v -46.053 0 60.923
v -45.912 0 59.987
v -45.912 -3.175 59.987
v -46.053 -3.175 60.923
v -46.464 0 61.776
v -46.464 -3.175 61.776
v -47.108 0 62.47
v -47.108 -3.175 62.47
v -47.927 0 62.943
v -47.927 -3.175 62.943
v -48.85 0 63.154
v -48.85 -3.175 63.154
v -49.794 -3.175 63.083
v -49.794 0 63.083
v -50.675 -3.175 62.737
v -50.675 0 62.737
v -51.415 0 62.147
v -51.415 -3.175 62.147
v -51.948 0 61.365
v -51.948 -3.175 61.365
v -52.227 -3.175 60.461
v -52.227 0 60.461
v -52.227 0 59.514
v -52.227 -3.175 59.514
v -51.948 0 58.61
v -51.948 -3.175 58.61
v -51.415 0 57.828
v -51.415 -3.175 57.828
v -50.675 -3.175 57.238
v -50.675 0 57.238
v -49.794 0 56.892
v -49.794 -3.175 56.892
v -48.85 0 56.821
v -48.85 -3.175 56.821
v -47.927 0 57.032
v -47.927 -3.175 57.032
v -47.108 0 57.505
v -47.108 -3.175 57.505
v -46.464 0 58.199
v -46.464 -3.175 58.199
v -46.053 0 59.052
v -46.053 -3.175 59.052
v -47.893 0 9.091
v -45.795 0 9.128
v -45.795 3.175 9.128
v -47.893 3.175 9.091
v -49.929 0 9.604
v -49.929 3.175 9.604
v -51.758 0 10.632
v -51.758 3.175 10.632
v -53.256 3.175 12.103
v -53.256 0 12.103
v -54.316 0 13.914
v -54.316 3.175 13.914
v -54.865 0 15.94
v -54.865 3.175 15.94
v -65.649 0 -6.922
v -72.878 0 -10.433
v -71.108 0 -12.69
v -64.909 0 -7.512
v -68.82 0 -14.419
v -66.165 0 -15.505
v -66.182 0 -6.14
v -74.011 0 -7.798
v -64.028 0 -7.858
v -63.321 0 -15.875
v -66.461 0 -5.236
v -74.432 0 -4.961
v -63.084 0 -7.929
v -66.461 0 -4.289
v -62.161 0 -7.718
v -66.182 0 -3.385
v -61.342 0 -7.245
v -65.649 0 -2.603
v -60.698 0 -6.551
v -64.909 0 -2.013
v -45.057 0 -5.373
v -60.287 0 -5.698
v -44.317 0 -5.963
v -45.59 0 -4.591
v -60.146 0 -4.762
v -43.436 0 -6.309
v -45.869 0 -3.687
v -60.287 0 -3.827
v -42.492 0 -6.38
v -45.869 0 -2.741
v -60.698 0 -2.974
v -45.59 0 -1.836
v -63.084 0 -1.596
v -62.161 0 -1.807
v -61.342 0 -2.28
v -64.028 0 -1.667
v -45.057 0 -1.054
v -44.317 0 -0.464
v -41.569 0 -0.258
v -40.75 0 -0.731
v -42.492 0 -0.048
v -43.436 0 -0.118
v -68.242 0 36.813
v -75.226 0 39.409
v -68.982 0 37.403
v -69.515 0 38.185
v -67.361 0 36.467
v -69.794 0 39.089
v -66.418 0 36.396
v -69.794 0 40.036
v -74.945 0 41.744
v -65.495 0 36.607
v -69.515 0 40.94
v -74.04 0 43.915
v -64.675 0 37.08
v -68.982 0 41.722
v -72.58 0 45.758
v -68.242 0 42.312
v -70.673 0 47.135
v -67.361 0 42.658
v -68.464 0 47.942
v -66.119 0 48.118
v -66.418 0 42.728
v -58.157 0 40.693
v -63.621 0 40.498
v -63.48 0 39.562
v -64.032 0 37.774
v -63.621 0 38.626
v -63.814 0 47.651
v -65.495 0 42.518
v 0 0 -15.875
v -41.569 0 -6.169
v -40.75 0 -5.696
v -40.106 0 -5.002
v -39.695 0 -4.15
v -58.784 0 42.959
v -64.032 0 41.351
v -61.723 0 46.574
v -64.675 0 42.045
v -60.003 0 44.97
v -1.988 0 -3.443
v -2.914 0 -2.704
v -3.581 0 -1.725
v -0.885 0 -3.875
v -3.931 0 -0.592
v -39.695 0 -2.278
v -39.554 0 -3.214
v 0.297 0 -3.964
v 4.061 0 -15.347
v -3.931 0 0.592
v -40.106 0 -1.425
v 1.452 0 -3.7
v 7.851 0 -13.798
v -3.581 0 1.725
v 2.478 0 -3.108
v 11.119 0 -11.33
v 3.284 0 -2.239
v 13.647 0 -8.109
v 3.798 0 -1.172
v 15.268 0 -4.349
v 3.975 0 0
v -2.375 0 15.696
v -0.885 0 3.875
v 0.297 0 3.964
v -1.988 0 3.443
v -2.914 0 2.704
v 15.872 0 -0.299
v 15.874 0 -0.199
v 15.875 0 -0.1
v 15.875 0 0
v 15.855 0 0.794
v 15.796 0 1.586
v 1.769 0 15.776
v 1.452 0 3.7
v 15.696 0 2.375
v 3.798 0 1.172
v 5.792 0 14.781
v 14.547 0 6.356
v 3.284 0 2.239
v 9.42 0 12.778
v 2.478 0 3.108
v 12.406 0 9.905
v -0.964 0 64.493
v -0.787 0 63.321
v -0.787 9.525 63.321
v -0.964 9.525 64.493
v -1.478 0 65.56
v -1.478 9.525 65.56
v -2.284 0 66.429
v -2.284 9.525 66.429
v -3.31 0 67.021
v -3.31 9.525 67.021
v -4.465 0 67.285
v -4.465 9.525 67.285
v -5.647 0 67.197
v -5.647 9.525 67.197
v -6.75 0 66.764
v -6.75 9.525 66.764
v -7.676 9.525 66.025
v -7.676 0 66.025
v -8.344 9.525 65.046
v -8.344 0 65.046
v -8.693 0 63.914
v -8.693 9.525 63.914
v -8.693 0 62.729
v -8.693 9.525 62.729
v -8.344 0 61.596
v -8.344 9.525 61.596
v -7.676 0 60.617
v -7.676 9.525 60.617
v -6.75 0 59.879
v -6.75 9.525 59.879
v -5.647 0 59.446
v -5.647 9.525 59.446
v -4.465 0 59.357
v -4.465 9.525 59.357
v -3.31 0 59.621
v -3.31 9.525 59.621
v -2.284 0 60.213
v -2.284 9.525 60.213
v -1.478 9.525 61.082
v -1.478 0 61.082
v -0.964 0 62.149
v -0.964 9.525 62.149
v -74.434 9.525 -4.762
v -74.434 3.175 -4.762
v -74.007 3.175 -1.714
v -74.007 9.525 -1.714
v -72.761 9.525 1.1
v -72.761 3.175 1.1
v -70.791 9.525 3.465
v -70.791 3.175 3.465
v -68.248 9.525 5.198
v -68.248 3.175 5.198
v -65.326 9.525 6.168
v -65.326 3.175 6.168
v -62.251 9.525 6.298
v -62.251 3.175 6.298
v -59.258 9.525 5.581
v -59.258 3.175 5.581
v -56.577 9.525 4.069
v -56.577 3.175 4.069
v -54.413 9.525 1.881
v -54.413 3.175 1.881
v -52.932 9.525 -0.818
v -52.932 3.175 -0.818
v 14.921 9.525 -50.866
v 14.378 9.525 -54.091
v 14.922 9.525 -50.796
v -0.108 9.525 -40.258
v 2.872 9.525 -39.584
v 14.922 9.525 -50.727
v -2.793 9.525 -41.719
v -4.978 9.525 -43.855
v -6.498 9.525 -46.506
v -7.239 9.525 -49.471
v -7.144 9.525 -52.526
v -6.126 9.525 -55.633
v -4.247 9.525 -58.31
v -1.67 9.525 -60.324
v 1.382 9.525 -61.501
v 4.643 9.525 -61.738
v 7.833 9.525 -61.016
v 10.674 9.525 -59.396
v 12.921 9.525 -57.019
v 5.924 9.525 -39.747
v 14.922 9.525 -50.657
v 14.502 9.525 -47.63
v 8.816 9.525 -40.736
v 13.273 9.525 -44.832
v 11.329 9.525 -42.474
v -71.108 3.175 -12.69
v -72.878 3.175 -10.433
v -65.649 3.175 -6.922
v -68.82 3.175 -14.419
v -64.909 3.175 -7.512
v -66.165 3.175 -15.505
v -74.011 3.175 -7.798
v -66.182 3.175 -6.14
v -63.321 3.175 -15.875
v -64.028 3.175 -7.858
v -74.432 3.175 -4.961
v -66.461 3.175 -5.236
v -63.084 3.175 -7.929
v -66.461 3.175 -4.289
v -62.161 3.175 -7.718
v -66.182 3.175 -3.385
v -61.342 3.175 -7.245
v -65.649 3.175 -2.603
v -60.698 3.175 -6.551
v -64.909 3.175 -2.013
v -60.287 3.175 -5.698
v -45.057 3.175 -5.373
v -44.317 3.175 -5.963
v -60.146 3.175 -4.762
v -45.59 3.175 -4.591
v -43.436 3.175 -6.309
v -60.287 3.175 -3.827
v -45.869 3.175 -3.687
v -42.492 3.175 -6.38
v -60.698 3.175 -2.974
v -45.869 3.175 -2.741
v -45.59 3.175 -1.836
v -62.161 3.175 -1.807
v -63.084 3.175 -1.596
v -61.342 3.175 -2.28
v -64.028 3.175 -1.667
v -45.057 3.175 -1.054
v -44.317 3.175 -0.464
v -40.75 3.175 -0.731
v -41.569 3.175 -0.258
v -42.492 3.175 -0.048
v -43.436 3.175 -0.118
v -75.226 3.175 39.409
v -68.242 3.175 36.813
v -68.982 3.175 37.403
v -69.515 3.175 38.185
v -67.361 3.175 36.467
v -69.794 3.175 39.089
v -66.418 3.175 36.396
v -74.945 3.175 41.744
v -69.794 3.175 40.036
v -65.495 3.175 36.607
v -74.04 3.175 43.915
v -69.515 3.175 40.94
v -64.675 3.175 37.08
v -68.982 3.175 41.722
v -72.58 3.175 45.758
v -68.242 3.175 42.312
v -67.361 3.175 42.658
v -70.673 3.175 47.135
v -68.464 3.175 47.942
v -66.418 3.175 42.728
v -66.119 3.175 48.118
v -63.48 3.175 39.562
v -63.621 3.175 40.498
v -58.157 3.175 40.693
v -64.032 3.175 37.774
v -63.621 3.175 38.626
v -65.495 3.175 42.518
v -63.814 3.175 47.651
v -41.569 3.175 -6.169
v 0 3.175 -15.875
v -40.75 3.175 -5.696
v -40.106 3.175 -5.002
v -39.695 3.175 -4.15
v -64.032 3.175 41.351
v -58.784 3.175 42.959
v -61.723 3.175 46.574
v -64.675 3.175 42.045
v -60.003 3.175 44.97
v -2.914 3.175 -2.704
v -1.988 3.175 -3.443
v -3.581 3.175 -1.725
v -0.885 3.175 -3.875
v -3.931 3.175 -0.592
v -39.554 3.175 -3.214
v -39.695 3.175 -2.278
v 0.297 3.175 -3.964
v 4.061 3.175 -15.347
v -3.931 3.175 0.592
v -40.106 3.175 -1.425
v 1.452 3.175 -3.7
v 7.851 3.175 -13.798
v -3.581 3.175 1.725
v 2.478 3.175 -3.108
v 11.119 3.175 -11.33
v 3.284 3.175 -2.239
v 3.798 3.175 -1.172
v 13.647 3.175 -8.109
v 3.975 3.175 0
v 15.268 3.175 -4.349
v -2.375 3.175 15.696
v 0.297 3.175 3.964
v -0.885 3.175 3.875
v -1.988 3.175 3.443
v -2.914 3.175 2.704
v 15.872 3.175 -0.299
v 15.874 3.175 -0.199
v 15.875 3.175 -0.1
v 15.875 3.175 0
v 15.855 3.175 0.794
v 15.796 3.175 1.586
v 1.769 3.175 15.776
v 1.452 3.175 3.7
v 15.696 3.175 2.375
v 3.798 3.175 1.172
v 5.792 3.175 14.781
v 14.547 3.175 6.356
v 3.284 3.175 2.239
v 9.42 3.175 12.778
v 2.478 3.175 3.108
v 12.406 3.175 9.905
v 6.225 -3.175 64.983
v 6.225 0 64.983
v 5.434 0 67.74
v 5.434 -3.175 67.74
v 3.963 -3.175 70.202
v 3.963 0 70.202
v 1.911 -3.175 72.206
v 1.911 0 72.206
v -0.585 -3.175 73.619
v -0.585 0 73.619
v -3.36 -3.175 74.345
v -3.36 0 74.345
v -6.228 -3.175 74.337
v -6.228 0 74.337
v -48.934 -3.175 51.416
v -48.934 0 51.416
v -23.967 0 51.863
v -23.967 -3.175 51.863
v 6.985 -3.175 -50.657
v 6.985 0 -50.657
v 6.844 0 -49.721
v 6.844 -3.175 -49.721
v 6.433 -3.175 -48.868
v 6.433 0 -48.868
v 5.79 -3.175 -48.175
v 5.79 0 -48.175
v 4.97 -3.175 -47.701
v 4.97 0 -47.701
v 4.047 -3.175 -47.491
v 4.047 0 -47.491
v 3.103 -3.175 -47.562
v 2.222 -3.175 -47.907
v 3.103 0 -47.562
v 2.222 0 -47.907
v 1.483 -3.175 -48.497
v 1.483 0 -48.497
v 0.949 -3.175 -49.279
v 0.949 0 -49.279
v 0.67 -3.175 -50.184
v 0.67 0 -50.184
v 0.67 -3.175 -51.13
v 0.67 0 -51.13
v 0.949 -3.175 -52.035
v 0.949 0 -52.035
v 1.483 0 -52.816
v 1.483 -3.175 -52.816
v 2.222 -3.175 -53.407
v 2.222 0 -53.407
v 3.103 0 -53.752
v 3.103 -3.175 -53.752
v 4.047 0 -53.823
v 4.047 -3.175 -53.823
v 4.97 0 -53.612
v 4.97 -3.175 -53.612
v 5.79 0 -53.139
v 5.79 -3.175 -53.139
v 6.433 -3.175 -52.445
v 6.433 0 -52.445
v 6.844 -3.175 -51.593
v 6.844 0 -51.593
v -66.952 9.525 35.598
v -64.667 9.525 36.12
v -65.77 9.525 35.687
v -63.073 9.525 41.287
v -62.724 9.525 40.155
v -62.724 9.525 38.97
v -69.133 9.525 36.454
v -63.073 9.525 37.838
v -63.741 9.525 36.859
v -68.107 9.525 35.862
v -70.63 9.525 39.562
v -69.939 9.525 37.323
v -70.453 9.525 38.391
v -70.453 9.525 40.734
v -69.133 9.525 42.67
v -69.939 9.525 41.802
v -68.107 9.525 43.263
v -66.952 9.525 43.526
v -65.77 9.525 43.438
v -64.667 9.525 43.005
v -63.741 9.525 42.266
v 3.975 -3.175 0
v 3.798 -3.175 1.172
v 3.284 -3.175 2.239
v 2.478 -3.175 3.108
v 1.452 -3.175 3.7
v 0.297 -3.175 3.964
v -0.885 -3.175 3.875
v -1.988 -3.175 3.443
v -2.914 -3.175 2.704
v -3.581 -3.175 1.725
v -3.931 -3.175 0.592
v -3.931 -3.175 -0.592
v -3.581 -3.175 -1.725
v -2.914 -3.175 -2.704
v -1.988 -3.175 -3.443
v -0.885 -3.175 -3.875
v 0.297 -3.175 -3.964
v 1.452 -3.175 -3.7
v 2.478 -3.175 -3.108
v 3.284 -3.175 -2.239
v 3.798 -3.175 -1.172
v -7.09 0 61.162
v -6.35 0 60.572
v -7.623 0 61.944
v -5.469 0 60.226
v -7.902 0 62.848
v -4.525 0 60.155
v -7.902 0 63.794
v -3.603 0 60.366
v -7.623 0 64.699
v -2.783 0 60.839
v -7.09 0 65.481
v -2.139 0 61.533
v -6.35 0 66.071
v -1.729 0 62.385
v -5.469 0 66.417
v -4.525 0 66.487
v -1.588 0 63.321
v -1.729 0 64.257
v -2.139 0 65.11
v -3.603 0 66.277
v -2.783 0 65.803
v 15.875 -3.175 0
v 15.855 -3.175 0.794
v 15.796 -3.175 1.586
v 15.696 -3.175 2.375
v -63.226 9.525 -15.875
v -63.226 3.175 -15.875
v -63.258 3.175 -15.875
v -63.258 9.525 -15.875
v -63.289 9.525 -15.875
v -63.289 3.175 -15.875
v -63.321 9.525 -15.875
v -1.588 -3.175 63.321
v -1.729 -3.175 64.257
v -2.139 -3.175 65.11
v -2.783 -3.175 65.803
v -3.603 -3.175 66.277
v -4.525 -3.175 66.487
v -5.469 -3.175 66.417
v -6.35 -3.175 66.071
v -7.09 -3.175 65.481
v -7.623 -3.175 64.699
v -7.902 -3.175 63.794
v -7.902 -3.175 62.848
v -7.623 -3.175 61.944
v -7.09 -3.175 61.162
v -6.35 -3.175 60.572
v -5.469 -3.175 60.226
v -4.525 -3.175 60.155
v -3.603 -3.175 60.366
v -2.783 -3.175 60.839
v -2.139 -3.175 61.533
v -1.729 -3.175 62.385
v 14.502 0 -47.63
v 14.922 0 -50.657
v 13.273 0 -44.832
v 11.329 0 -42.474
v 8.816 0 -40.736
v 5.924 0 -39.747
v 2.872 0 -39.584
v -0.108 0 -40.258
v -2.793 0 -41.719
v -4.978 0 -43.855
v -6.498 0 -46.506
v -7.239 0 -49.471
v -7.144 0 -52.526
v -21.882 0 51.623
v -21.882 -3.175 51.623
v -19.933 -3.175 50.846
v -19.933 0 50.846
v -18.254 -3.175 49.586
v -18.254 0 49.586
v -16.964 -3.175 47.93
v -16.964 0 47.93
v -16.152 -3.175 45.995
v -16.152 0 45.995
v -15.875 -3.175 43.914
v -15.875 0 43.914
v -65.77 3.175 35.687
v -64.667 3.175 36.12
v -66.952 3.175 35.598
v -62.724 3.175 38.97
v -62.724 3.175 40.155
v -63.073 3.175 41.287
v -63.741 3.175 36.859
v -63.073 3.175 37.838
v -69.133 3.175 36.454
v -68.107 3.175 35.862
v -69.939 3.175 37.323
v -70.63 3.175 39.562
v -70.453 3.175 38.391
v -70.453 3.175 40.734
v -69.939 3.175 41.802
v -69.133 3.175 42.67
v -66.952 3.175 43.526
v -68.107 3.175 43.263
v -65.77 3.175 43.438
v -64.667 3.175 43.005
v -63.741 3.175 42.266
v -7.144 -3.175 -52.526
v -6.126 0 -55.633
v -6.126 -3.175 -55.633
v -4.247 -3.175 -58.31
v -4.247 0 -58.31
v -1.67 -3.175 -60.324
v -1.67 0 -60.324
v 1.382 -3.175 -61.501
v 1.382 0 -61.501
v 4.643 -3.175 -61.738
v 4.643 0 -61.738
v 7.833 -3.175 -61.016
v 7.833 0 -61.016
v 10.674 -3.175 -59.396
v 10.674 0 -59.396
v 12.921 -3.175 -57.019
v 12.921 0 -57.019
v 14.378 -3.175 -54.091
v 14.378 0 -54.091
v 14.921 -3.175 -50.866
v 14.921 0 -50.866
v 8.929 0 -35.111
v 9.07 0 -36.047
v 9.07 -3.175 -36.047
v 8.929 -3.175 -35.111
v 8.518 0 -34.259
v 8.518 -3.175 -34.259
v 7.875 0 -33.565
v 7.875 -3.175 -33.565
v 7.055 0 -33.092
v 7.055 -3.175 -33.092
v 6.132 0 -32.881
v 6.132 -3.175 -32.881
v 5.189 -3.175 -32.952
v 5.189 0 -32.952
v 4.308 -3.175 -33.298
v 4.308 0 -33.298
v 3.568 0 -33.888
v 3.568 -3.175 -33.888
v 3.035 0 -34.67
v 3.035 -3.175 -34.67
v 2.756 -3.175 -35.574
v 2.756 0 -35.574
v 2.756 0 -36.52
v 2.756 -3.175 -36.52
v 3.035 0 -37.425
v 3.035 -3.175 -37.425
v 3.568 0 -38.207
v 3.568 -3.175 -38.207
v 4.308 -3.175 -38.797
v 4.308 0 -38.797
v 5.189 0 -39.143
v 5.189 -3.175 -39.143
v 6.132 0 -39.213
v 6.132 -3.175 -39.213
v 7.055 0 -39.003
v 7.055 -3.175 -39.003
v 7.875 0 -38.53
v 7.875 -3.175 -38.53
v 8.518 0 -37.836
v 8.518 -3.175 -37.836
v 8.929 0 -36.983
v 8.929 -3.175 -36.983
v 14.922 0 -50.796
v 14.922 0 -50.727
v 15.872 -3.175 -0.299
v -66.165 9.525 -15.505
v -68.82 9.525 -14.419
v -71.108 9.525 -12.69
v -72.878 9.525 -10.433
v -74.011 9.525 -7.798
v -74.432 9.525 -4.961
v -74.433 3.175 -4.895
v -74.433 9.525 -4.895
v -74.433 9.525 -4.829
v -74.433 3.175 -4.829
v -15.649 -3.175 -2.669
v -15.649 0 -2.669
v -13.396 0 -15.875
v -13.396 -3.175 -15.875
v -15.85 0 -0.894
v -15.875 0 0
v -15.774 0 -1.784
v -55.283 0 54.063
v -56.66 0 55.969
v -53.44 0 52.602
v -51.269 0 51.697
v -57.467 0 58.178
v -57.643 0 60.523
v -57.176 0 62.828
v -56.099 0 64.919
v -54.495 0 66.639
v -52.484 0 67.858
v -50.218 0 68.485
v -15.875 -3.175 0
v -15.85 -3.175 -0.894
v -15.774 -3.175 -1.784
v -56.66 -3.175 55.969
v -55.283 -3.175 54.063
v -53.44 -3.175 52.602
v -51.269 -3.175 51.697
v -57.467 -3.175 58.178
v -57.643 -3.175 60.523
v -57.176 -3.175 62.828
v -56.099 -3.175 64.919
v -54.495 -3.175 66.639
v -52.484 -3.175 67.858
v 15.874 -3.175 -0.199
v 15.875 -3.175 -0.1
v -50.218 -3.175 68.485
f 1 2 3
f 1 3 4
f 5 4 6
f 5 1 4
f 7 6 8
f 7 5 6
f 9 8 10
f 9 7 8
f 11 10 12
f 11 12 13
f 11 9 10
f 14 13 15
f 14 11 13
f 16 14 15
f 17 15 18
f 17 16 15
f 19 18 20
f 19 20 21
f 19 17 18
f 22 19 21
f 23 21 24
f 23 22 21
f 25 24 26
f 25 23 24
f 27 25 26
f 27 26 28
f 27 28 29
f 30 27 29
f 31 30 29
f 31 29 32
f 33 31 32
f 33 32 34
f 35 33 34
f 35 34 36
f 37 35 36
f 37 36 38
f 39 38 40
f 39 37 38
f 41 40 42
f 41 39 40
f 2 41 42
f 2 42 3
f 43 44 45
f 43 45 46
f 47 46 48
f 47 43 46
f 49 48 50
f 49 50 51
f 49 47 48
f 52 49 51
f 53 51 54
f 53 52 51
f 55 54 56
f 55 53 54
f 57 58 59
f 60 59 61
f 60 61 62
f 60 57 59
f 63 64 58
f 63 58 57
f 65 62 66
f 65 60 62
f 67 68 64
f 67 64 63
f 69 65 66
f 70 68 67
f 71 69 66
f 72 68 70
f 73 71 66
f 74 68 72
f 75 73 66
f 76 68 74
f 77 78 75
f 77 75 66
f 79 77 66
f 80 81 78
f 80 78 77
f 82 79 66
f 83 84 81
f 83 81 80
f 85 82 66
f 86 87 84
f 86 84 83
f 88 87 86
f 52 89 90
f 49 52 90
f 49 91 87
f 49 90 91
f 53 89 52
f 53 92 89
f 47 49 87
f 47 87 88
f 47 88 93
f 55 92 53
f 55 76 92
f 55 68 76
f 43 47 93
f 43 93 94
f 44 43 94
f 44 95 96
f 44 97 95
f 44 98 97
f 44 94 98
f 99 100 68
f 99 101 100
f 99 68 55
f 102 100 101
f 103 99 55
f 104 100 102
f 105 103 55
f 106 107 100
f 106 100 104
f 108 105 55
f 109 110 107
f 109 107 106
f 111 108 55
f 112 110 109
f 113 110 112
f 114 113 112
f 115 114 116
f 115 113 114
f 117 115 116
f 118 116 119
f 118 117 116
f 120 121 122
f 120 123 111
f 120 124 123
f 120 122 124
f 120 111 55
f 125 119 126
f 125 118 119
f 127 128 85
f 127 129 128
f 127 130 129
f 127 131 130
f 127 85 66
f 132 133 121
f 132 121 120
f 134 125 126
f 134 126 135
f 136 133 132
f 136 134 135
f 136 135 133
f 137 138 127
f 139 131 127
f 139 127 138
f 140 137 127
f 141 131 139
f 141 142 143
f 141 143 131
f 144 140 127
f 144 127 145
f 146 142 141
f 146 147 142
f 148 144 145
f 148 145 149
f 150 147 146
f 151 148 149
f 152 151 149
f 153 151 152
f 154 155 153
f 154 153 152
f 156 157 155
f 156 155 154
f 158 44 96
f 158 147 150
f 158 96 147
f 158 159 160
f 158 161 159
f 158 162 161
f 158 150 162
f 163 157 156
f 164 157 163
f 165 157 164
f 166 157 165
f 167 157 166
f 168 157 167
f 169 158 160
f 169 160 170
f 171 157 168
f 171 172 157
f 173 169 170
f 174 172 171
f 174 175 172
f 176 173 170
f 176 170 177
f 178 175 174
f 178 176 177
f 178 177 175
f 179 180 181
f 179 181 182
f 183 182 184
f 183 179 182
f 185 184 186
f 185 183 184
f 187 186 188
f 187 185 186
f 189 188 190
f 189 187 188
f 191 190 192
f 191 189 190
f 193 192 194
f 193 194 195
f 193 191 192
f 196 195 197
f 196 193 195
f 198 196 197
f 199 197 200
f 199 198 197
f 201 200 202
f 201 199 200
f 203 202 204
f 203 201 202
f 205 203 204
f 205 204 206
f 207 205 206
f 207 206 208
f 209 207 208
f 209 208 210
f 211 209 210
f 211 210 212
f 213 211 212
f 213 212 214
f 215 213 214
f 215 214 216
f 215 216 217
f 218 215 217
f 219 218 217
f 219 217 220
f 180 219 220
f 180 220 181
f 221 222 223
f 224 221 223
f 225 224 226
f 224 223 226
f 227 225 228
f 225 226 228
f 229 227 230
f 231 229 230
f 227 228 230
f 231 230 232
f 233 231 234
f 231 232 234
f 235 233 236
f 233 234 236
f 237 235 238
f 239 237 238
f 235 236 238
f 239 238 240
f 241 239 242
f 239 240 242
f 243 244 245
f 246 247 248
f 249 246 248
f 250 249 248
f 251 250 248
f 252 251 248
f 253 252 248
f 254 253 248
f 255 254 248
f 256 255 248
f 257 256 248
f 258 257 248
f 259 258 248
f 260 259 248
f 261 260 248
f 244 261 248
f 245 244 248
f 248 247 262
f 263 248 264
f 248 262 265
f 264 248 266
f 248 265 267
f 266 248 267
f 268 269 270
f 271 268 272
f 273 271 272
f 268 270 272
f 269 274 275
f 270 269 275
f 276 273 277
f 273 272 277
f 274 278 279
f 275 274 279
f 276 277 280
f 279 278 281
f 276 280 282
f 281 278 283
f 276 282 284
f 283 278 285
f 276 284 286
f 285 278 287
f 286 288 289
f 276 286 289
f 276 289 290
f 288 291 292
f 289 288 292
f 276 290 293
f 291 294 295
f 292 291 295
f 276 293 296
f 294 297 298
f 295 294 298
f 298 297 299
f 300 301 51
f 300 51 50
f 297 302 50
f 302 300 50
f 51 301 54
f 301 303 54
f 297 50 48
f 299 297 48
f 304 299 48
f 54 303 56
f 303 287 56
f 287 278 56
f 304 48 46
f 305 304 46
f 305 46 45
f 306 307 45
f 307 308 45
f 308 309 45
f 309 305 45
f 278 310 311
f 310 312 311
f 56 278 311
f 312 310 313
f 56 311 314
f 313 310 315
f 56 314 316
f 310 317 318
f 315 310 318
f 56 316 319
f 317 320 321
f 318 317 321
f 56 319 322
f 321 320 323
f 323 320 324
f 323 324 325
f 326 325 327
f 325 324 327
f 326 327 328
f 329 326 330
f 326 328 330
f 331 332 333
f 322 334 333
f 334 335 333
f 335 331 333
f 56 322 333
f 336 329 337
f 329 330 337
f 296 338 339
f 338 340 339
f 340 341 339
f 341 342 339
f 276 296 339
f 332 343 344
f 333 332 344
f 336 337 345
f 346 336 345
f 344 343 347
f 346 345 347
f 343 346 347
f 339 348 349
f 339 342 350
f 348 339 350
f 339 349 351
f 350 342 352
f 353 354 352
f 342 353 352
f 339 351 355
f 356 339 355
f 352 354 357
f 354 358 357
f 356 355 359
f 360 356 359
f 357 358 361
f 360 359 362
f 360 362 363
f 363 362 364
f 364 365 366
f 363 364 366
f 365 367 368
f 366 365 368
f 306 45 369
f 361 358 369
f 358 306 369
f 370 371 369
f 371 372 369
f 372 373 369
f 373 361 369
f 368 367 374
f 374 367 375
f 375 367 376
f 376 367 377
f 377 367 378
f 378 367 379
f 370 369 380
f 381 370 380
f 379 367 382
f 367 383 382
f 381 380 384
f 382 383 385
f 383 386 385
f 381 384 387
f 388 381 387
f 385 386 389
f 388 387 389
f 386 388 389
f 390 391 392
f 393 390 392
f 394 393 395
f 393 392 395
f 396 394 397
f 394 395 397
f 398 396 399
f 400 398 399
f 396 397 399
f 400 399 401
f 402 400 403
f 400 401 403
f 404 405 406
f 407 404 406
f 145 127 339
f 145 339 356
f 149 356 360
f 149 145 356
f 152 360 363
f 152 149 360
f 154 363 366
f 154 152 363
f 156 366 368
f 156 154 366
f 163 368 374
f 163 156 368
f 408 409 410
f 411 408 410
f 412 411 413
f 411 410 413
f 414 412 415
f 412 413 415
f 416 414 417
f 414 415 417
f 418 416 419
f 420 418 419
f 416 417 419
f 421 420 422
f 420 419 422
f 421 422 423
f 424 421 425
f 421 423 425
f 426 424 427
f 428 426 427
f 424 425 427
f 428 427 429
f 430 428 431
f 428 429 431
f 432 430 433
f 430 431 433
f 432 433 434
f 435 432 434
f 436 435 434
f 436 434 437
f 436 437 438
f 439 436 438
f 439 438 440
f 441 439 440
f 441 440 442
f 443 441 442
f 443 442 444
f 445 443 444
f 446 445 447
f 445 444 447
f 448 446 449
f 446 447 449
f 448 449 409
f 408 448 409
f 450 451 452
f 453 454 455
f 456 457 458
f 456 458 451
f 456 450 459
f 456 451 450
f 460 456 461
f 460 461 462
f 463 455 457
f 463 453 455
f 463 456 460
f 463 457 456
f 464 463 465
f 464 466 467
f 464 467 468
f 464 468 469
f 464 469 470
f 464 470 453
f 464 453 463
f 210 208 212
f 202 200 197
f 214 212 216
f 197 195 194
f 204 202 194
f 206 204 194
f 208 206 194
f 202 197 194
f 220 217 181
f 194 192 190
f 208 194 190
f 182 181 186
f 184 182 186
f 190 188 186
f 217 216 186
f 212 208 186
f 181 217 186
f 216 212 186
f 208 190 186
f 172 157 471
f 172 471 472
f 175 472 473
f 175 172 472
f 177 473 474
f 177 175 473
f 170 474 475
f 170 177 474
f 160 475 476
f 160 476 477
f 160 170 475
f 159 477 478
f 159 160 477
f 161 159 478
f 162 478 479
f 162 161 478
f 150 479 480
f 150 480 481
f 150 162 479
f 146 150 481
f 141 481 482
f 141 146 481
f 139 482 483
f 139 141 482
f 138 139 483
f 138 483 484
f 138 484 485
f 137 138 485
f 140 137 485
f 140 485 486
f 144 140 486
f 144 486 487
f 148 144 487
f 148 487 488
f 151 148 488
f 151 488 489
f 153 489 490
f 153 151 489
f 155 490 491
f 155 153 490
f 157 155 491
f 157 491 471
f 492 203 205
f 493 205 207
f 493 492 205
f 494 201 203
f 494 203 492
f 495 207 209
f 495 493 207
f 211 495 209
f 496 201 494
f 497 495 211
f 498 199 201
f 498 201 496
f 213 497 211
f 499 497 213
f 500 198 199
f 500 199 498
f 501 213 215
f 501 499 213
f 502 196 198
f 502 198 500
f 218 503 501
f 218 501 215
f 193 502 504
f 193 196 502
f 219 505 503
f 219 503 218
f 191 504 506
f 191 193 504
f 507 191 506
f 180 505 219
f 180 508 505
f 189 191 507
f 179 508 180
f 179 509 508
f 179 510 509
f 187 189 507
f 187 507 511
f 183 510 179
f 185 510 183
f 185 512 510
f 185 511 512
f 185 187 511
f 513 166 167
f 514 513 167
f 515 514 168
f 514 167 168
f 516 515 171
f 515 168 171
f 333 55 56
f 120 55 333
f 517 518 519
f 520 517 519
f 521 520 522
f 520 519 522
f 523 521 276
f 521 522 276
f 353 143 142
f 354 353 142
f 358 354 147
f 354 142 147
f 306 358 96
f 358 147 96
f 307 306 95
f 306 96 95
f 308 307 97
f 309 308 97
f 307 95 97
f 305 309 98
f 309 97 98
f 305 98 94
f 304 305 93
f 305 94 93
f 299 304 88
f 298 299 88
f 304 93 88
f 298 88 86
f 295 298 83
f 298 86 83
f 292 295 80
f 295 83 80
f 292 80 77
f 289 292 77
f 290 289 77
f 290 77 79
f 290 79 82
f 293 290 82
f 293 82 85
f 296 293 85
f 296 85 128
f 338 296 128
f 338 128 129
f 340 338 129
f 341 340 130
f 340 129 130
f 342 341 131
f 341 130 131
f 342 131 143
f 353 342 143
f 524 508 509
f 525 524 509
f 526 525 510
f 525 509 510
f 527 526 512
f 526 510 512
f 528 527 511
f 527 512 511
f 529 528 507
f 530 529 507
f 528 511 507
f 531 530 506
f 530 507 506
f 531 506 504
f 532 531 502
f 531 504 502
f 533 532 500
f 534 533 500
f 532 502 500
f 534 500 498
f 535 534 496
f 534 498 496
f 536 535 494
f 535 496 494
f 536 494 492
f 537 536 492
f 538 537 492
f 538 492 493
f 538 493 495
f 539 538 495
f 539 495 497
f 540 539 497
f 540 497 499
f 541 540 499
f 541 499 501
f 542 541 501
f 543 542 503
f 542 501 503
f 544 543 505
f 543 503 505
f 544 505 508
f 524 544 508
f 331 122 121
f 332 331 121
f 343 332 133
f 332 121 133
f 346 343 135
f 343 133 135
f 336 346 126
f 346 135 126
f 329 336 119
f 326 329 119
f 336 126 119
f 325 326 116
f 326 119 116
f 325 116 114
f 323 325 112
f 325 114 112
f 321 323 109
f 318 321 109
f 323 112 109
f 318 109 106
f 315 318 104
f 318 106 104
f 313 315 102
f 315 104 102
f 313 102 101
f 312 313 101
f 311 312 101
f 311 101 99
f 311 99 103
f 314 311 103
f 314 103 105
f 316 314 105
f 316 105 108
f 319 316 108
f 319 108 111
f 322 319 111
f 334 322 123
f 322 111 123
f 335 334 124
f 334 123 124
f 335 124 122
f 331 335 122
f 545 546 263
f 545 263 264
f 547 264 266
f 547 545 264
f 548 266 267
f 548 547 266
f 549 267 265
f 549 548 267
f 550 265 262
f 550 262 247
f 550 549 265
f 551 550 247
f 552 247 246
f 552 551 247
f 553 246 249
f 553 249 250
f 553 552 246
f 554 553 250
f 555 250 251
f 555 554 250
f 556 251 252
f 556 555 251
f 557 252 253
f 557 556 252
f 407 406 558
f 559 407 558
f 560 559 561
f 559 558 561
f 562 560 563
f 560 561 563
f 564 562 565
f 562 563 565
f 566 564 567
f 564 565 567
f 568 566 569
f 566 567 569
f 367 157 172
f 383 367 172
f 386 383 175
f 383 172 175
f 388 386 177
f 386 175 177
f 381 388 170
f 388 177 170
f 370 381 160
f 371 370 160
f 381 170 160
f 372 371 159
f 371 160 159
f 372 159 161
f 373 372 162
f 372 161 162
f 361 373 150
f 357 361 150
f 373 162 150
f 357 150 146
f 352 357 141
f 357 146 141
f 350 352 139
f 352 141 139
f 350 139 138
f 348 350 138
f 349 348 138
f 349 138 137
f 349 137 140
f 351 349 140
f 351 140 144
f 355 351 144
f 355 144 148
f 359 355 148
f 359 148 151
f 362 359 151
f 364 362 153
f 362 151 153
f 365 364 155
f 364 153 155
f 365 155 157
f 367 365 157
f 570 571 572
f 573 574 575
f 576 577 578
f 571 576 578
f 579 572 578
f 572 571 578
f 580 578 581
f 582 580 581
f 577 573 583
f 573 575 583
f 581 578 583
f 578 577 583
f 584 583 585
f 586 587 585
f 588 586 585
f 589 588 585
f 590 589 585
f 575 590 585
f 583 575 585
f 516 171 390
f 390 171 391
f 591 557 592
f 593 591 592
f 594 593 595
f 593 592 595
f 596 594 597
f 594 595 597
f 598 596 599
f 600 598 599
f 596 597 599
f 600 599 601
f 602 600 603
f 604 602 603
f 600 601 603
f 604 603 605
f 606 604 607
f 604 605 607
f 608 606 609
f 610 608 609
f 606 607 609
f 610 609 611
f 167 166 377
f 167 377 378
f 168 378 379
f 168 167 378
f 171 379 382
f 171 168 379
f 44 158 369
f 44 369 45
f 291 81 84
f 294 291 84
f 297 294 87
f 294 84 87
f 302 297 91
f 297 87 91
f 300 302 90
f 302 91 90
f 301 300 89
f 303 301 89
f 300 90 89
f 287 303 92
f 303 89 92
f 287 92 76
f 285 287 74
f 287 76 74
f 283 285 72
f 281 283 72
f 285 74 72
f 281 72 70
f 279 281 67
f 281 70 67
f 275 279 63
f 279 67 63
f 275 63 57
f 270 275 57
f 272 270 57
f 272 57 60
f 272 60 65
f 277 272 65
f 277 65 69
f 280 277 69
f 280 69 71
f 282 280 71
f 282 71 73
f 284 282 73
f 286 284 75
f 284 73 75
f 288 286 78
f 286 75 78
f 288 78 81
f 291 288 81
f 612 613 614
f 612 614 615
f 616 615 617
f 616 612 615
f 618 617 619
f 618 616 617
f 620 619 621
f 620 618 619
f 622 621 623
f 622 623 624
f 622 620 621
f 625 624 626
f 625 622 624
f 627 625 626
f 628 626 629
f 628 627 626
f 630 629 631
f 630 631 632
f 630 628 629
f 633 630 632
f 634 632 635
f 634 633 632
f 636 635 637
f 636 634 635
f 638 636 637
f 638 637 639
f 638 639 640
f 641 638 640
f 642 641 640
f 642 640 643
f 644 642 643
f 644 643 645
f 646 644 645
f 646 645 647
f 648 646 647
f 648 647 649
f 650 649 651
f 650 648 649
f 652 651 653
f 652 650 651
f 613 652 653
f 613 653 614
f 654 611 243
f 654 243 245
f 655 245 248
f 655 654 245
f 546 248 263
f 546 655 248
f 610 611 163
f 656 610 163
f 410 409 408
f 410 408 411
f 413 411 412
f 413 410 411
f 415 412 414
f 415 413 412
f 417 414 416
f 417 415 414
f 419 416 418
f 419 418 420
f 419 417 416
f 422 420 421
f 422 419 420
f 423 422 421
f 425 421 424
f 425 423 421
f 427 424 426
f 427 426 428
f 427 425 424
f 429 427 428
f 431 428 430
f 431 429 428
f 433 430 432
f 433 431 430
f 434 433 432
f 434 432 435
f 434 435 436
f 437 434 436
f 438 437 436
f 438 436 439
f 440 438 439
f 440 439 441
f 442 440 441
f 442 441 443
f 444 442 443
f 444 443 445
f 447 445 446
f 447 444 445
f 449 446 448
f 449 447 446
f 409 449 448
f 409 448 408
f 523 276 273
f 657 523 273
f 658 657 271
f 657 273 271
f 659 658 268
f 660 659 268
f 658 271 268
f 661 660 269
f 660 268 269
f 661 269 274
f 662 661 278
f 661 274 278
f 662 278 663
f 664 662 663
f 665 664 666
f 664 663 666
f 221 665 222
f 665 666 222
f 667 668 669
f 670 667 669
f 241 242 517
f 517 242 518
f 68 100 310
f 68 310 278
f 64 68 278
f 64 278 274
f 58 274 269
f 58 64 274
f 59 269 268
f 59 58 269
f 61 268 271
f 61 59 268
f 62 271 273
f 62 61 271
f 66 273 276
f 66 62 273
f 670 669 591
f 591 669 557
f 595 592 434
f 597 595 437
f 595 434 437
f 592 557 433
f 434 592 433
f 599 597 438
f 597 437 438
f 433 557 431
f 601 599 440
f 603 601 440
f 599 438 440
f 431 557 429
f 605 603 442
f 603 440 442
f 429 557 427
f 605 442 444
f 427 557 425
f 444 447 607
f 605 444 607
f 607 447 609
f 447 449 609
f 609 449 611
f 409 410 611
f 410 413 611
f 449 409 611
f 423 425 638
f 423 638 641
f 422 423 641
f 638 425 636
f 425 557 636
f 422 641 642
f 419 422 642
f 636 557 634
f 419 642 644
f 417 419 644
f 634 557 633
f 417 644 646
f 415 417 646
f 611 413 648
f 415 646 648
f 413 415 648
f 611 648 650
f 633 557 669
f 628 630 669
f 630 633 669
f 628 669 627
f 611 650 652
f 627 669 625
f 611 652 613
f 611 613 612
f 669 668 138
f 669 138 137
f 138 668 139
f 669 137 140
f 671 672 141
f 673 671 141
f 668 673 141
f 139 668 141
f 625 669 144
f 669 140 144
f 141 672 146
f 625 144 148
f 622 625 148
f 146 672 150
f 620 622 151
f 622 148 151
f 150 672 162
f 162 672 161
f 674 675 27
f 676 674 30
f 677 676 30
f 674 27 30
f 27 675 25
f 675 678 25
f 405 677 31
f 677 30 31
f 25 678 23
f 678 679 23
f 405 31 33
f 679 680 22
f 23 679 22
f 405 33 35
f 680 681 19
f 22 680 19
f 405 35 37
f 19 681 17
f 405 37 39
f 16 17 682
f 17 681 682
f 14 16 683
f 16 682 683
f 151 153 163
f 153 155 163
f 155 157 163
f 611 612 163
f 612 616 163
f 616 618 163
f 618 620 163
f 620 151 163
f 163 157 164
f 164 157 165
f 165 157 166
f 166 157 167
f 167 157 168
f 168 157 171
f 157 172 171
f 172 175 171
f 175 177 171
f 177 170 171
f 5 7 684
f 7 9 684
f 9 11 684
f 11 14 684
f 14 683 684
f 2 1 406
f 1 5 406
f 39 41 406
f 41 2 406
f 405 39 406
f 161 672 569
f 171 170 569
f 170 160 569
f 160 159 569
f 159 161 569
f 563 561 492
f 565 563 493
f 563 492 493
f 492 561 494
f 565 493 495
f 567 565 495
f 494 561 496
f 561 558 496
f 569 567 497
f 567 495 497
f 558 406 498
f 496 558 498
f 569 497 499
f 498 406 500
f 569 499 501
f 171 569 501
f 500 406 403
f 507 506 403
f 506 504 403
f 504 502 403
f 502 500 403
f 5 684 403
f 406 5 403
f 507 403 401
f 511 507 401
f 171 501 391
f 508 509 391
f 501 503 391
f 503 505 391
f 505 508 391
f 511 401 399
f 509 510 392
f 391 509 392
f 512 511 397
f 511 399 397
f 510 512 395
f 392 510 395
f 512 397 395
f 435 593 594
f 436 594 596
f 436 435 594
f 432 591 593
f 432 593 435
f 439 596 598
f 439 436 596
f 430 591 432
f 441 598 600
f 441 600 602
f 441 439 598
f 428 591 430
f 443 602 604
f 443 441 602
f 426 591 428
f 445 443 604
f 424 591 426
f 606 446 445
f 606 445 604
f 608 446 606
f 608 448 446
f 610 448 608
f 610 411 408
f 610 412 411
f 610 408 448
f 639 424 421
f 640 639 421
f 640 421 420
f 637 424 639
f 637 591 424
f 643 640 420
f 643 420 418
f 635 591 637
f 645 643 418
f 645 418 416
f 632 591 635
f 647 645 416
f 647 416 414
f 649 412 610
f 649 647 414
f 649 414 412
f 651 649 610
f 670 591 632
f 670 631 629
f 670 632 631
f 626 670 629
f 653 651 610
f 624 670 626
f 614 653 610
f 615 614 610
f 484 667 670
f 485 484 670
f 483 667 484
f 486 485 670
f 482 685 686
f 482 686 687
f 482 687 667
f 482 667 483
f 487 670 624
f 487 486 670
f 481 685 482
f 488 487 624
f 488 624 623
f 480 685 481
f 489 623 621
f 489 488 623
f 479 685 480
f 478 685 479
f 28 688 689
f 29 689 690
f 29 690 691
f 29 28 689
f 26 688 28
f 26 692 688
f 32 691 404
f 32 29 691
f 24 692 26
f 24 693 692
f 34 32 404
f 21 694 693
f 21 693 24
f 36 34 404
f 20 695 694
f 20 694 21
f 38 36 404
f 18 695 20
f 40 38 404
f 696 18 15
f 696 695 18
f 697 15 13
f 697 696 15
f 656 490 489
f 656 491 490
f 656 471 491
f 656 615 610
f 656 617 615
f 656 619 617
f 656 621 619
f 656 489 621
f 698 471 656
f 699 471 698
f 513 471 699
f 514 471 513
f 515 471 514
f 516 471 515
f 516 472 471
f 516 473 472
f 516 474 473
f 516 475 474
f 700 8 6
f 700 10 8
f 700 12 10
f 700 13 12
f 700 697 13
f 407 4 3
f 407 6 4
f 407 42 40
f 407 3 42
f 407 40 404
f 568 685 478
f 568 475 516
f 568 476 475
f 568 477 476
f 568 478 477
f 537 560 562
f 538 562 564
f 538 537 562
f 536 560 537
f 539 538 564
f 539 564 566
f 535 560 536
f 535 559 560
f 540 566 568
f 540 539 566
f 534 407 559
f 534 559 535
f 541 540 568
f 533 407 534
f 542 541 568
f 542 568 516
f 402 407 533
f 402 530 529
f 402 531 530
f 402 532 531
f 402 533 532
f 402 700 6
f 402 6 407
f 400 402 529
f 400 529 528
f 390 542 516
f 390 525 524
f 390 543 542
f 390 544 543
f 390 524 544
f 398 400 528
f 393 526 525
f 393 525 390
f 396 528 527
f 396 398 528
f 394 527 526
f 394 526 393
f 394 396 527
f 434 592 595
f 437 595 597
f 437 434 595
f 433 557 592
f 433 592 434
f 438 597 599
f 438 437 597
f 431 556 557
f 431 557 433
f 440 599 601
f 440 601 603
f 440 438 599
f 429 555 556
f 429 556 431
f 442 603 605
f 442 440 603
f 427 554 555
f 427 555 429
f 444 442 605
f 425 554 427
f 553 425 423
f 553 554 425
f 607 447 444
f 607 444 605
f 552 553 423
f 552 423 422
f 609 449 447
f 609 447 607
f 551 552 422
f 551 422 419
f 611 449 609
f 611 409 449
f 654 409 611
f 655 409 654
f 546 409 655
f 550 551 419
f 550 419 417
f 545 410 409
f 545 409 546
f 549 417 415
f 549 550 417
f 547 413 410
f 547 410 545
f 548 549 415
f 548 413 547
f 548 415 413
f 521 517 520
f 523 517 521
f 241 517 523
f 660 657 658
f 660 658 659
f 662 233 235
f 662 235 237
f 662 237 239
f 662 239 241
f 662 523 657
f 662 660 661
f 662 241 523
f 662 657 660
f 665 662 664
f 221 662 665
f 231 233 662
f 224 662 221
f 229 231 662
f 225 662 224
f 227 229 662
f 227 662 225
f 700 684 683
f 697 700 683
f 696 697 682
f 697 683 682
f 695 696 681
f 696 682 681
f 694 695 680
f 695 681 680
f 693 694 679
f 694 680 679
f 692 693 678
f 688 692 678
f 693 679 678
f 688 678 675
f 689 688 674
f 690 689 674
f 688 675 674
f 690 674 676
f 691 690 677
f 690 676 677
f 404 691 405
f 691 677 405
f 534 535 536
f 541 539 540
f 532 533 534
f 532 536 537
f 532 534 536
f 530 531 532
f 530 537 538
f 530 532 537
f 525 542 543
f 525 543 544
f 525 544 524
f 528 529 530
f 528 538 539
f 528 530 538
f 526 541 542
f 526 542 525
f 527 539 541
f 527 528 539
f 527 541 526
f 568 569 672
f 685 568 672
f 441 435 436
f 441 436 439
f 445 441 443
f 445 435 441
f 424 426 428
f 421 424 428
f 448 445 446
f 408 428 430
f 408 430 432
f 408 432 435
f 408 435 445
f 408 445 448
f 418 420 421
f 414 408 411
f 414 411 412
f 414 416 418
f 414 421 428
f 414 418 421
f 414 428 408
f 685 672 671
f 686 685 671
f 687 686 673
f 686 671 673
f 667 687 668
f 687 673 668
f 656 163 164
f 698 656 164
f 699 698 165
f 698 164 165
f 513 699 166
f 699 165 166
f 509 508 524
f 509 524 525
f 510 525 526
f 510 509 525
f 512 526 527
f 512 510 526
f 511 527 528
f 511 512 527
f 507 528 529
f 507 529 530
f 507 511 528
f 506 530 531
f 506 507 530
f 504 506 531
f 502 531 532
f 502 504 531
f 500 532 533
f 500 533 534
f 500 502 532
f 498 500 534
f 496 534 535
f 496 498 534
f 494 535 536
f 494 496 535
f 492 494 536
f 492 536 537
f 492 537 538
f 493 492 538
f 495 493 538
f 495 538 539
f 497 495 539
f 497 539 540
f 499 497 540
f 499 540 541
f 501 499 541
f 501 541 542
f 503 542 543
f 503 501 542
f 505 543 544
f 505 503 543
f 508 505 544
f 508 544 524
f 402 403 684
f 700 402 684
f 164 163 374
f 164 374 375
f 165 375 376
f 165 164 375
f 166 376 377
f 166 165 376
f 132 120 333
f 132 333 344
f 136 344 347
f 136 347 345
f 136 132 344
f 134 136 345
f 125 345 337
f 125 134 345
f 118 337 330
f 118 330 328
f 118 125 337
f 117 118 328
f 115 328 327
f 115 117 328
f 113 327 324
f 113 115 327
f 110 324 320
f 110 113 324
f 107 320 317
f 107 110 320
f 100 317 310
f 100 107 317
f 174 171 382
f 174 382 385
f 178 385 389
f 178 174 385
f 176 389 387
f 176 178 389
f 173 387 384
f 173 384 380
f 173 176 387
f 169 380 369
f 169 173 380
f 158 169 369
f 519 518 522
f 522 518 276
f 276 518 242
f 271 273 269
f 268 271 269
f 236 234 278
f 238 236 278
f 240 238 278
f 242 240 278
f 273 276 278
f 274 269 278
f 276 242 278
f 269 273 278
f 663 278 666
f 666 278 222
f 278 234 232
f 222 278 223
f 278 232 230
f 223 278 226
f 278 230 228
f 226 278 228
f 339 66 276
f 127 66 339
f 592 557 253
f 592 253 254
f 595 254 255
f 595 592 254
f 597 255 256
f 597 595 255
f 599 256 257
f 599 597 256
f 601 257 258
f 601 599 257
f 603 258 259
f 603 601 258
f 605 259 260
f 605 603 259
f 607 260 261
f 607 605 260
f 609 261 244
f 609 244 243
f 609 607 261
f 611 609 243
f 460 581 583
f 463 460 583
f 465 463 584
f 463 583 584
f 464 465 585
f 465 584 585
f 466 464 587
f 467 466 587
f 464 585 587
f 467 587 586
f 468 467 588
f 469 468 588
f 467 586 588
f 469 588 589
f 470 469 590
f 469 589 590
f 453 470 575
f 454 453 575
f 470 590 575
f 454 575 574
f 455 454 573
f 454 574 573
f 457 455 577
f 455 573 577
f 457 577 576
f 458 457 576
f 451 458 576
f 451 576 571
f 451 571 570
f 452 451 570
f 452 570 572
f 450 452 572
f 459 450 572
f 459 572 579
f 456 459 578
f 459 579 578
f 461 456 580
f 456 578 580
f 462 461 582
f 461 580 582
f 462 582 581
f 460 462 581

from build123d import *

# Parameters (mm, degrees)
F0_R     = 3.9751
F0_R_2   = 3.175
F1_DEPTH = 3.175
F2_DEPTH = 3.175
F3_R     = 3.175
F6_DEPTH = 12.7
F3_R_2   = 3.9751
F7_DEPTH = 12.7
F4_R     = 3.9751
F4_R_2   = 3.175
F8_DEPTH = 6.35
F9_DEPTH = 6.35


with BuildPart() as f1:
    # F0 (on Front) → F1 (new body)
    with BuildSketch(Plane.XZ):
        with BuildLine():
            ThreePointArc((-2.3745433357, 15.696406243), (9.4199796185, 12.7780909758), (15.69640625, 2.3745432898))
            Line((15.69640625, 2.3745432898), (6.224984375, 64.9833346965))
            ThreePointArc((6.224984375, 64.9833346965), (6.3187020189, 64.1545918937), (6.35, 63.3211543937))
            ThreePointArc((6.35, 63.3211543937), (-12.0838609408, 54.9614097669), (-6.227787217, 74.3366248612))
            Line((-6.227787217, 74.3366248612), (-50.2176725002, 68.4850530401))
            ThreePointArc((-50.2176725002, 68.4850530401), (-43.4394010641, 66.4363502486), (-40.5148080756, 59.9874043937))
            ThreePointArc((-40.5148080756, 59.9874043937), (-42.9716372644, 53.9802148029), (-48.9338986045, 51.4162771759))
            Line((-48.9338986045, 51.4162771759), (-23.9674730798, 51.8631362688))
            ThreePointArc((-23.9674730798, 51.8631362688), (-18.2540878758, 49.5859278087), (-15.875, 43.9142093972))
            Line((-15.875, 43.9142093972), (-15.875, 13.6540649408))
            Line((-15.875, 13.6540649408), (-2.3745433357, 15.696406243))
        make_face()
        with BuildLine():
            ThreePointArc((15.8721894623, -0.2987083423), (15.87429735, -0.1493607821), (15.875, 0))
            ThreePointArc((15.875, 0), (15.8302885984, 1.190625), (15.69640625, 2.3745432898))
            ThreePointArc((15.69640625, 2.3745432898), (9.4199796185, 12.7780909758), (-2.3745433357, 15.696406243))
            ThreePointArc((-2.3745433357, 15.696406243), (-12.0356034426, 10.3518053871), (-15.875, 0))
            ThreePointArc((-15.875, 0), (-15.8183858688, -1.3395124137), (-15.6489472748, -2.6694707699))
            ThreePointArc((-15.6489472748, -2.6694707699), (-10.238109604, -12.1324662265), (0, -15.875))
            ThreePointArc((0, -15.875), (11.1192092809, -11.3304373246), (15.8721894623, -0.2987083423))
        make_face()
        Circle(F0_R, mode=Mode.SUBTRACT)
        with BuildLine():
            Line((14.9205326236, -50.8660193546), (15.8721894623, -0.2987083423))
            ThreePointArc((15.8721894623, -0.2987083423), (11.1192092809, -11.3304373246), (0, -15.875))
            Line((0, -15.875), (-13.3962862068, -15.875))
            Line((-13.3962862068, -15.875), (-7.1442630923, -52.5255530539))
            ThreePointArc((-7.1442630923, -52.5255530539), (2.8723413104, -39.5840534068), (14.9225, -50.656923515))
            ThreePointArc((14.9225, -50.656923515), (14.922008145, -50.7614760624), (14.9205326236, -50.8660193546))
        make_face()
        with Locations((5.8951430199, -36.0471939817)):
            Circle(F0_R_2, mode=Mode.SUBTRACT)
        with BuildLine():
            ThreePointArc((-7.1442630923, -52.5255530539), (4.6434375, -61.7381255339), (14.9205326236, -50.8660193546))
            ThreePointArc((14.9205326236, -50.8660193546), (14.922008145, -50.7614760624), (14.9225, -50.656923515))
            ThreePointArc((14.9225, -50.656923515), (2.8723413104, -39.5840534068), (-7.1442630923, -52.5255530539))
        make_face()
        with Locations((3.81, -50.656923515)):
            Circle(F0_R_2, mode=Mode.SUBTRACT)
        with BuildLine():
            ThreePointArc((6.35, 63.3211543937), (6.3187020189, 64.1545918937), (6.224984375, 64.9833346965))
            ThreePointArc((6.224984375, 64.9833346965), (1.9112597279, 72.2064561525), (-6.227787217, 74.3366248612))
            ThreePointArc((-6.227787217, 74.3366248612), (-12.0838609408, 54.9614097669), (6.35, 63.3211543937))
        make_face()
        with Locations((-4.7625, 63.3211543937)):
            Circle(F0_R_2, mode=Mode.SUBTRACT)
        with BuildLine():
            ThreePointArc((-40.5148080756, 59.9874043937), (-43.4394010641, 66.4363502486), (-50.2176725002, 68.4850530401))
            ThreePointArc((-50.2176725002, 68.4850530401), (-57.6356639187, 59.3444668937), (-48.9338986045, 51.4162771759))
            ThreePointArc((-48.9338986045, 51.4162771759), (-42.9716372644, 53.9802148029), (-40.5148080756, 59.9874043937))
        make_face()
        with Locations((-49.0873080756, 59.9874043937)):
            Circle(F0_R_2, mode=Mode.SUBTRACT)
        with BuildLine():
            ThreePointArc((-15.875, 0), (-12.0356034426, 10.3518053871), (-2.3745433357, 15.696406243))
            Line((-2.3745433357, 15.696406243), (-15.875, 13.6540649408))
            Line((-15.875, 13.6540649408), (-15.875, 0))
        make_face()
        with BuildLine():
            Line((-13.3962862068, -15.875), (0, -15.875))
            ThreePointArc((0, -15.875), (-10.238109604, -12.1324662265), (-15.6489472748, -2.6694707699))
            Line((-15.6489472748, -2.6694707699), (-13.3962862068, -15.875))
        make_face()
    extrude(amount=F1_DEPTH)


with BuildPart() as f2:
    # F0 (on Front) → F2 (new body)
    with BuildSketch(Plane.XZ):
        with BuildLine():
            ThreePointArc((-15.6489472748, -2.6694707699), (-15.8183858688, -1.3395124137), (-15.875, 0))
            Line((-15.875, 0), (-15.875, 13.6540649408))
            Line((-15.875, 13.6540649408), (-45.7947178313, 9.1278272737))
            ThreePointArc((-45.7947178313, 9.1278272737), (-51.7584874989, 10.6317887797), (-54.864671411, 15.9402791832))
            Line((-54.864671411, 15.9402791832), (-58.1572557473, 40.6926725002))
            ThreePointArc((-58.1572557473, 40.6926725002), (-58.1011377008, 40.1287280738), (-58.0824043937, 39.5623080756))
            ThreePointArc((-58.0824043937, 39.5623080756), (-66.5781965871, 30.990151278), (-75.2260316115, 39.4088986045))
            Line((-75.2260316115, 39.4088986045), (-74.4318748612, -4.9613641292))
            ThreePointArc((-74.4318748612, -4.9613641292), (-63.4205904392, 6.349555108), (-52.2086543937, -4.7625))
            ThreePointArc((-52.2086543937, -4.7625), (-55.4634302878, -12.6202241059), (-63.3211543937, -15.875))
            Line((-63.3211543937, -15.875), (-13.3962862068, -15.875))
            Line((-13.3962862068, -15.875), (-15.6489472748, -2.6694707699))
        make_face()
        with Locations((-42.7291149849, -3.213735)):
            Circle(F0_R_2, mode=Mode.SUBTRACT)
        with BuildLine():
            ThreePointArc((-58.0824043937, 39.5623080756), (-58.1011377008, 40.1287280738), (-58.1572557473, 40.6926725002))
            ThreePointArc((-58.1572557473, 40.6926725002), (-67.2978418937, 48.1106639187), (-75.2260316115, 39.4088986045))
            ThreePointArc((-75.2260316115, 39.4088986045), (-66.5781965871, 30.990151278), (-58.0824043937, 39.5623080756))
        make_face()
        with Locations((-66.6549043937, 39.5623080756)):
            Circle(F0_R_2, mode=Mode.SUBTRACT)
        with BuildLine():
            ThreePointArc((-74.4318748612, -4.9613641292), (-71.1082520114, -12.6902214219), (-63.3211543937, -15.875))
            ThreePointArc((-63.3211543937, -15.875), (-55.4634302878, -12.6202241059), (-52.2086543937, -4.7625))
            ThreePointArc((-52.2086543937, -4.7625), (-63.4205904392, 6.349555108), (-74.4318748612, -4.9613641292))
        make_face()
        with Locations((-63.3211543937, -4.7625)):
            Circle(F0_R_2, mode=Mode.SUBTRACT)
        with BuildLine():
            ThreePointArc((-15.875, 0), (-12.0356034426, 10.3518053871), (-2.3745433357, 15.696406243))
            Line((-2.3745433357, 15.696406243), (-15.875, 13.6540649408))
            Line((-15.875, 13.6540649408), (-15.875, 0))
        make_face()
        with BuildLine():
            ThreePointArc((15.8721894623, -0.2987083423), (15.87429735, -0.1493607821), (15.875, 0))
            ThreePointArc((15.875, 0), (15.8302885984, 1.190625), (15.69640625, 2.3745432898))
            ThreePointArc((15.69640625, 2.3745432898), (9.4199796185, 12.7780909758), (-2.3745433357, 15.696406243))
            ThreePointArc((-2.3745433357, 15.696406243), (-12.0356034426, 10.3518053871), (-15.875, 0))
            ThreePointArc((-15.875, 0), (-15.8183858688, -1.3395124137), (-15.6489472748, -2.6694707699))
            ThreePointArc((-15.6489472748, -2.6694707699), (-10.238109604, -12.1324662265), (0, -15.875))
            ThreePointArc((0, -15.875), (11.1192092809, -11.3304373246), (15.8721894623, -0.2987083423))
        make_face()
        Circle(F0_R, mode=Mode.SUBTRACT)
        with BuildLine():
            Line((-13.3962862068, -15.875), (0, -15.875))
            ThreePointArc((0, -15.875), (-10.238109604, -12.1324662265), (-15.6489472748, -2.6694707699))
            Line((-15.6489472748, -2.6694707699), (-13.3962862068, -15.875))
        make_face()
    extrude(amount=-F2_DEPTH)


with BuildPart() as f6:
    # F3 (on face) → F6 (new body, through all)
    with BuildSketch(Plane.XZ.offset(3.175)):
        with BuildLine():
            ThreePointArc((14.9205326236, -50.8660193546), (14.922008145, -50.7614760624), (14.9225, -50.656923515))
            ThreePointArc((14.9225, -50.656923515), (2.8723413104, -39.5840534068), (-7.1442630923, -52.5255530539))
            ThreePointArc((-7.1442630923, -52.5255530539), (4.6434375, -61.7381255339), (14.9205326236, -50.8660193546))
        make_face()
        with Locations((3.81, -50.656923515)):
            Circle(F3_R, mode=Mode.SUBTRACT)
        with Locations((3.81, -50.656923515)):
            Circle(F3_R)
    extrude(amount=-F6_DEPTH)

    # F10: cut F1
    add(f1.part, mode=Mode.SUBTRACT)


with BuildPart() as f7:
    # F3 (on face) → F7 (new body, through all)
    with BuildSketch(Plane.XZ.offset(3.175)):
        with Locations((-4.7625, 63.3211543937)):
            Circle(F3_R_2)
        with Locations((-4.7625, 63.3211543937)):
            Circle(F3_R, mode=Mode.SUBTRACT)
        with Locations((-4.7625, 63.3211543937)):
            Circle(F3_R)
    extrude(amount=-F7_DEPTH)

    # F10: cut F1
    add(f1.part, mode=Mode.SUBTRACT)


with BuildPart() as f8:
    # F4 (on face) → F8 (new body, through all)
    with BuildSketch(Plane(origin=(0, 3.175, 0), x_dir=(-1, 0, 0), z_dir=(0, 1, 0))):
        with Locations((66.6549043937, 39.5623080756)):
            Circle(F4_R)
        with Locations((66.6549043937, 39.5623080756)):
            Circle(F4_R_2, mode=Mode.SUBTRACT)
        with Locations((66.6549043937, 39.5623080756)):
            Circle(F4_R_2)
    extrude(amount=F8_DEPTH)

    # F11: cut F2
    add(f2.part, mode=Mode.SUBTRACT)


with BuildPart() as f9:
    # F4 (on face) → F9 (new body, through all)
    with BuildSketch(Plane(origin=(0, 3.175, 0), x_dir=(-1, 0, 0), z_dir=(0, 1, 0))):
        with BuildLine():
            ThreePointArc((74.4318748612, -4.9613641292), (74.4332095017, -4.8619360455), (74.4336543937, -4.7625))
            ThreePointArc((74.4336543937, -4.7625), (65.3263635487, 6.1675865731), (52.9323194115, -0.8179133342))
            Line((52.9323194115, -0.8179133342), (63.2258644543, -15.8745914358))
            ThreePointArc((63.2258644543, -15.8745914358), (63.273508986, -15.8748978585), (63.3211543937, -15.875))
            ThreePointArc((63.3211543937, -15.875), (71.1082520114, -12.6902214219), (74.4318748612, -4.9613641292))
        make_face()
        with Locations((63.3211543937, -4.7625)):
            Circle(F4_R_2, mode=Mode.SUBTRACT)
        with Locations((63.3211543937, -4.7625)):
            Circle(F4_R_2)
    extrude(amount=F9_DEPTH)

    # F11: cut F2
    add(f2.part, mode=Mode.SUBTRACT)


solid = Compound([f1.part, f2.part, f6.part, f7.part, f8.part, f9.part])
